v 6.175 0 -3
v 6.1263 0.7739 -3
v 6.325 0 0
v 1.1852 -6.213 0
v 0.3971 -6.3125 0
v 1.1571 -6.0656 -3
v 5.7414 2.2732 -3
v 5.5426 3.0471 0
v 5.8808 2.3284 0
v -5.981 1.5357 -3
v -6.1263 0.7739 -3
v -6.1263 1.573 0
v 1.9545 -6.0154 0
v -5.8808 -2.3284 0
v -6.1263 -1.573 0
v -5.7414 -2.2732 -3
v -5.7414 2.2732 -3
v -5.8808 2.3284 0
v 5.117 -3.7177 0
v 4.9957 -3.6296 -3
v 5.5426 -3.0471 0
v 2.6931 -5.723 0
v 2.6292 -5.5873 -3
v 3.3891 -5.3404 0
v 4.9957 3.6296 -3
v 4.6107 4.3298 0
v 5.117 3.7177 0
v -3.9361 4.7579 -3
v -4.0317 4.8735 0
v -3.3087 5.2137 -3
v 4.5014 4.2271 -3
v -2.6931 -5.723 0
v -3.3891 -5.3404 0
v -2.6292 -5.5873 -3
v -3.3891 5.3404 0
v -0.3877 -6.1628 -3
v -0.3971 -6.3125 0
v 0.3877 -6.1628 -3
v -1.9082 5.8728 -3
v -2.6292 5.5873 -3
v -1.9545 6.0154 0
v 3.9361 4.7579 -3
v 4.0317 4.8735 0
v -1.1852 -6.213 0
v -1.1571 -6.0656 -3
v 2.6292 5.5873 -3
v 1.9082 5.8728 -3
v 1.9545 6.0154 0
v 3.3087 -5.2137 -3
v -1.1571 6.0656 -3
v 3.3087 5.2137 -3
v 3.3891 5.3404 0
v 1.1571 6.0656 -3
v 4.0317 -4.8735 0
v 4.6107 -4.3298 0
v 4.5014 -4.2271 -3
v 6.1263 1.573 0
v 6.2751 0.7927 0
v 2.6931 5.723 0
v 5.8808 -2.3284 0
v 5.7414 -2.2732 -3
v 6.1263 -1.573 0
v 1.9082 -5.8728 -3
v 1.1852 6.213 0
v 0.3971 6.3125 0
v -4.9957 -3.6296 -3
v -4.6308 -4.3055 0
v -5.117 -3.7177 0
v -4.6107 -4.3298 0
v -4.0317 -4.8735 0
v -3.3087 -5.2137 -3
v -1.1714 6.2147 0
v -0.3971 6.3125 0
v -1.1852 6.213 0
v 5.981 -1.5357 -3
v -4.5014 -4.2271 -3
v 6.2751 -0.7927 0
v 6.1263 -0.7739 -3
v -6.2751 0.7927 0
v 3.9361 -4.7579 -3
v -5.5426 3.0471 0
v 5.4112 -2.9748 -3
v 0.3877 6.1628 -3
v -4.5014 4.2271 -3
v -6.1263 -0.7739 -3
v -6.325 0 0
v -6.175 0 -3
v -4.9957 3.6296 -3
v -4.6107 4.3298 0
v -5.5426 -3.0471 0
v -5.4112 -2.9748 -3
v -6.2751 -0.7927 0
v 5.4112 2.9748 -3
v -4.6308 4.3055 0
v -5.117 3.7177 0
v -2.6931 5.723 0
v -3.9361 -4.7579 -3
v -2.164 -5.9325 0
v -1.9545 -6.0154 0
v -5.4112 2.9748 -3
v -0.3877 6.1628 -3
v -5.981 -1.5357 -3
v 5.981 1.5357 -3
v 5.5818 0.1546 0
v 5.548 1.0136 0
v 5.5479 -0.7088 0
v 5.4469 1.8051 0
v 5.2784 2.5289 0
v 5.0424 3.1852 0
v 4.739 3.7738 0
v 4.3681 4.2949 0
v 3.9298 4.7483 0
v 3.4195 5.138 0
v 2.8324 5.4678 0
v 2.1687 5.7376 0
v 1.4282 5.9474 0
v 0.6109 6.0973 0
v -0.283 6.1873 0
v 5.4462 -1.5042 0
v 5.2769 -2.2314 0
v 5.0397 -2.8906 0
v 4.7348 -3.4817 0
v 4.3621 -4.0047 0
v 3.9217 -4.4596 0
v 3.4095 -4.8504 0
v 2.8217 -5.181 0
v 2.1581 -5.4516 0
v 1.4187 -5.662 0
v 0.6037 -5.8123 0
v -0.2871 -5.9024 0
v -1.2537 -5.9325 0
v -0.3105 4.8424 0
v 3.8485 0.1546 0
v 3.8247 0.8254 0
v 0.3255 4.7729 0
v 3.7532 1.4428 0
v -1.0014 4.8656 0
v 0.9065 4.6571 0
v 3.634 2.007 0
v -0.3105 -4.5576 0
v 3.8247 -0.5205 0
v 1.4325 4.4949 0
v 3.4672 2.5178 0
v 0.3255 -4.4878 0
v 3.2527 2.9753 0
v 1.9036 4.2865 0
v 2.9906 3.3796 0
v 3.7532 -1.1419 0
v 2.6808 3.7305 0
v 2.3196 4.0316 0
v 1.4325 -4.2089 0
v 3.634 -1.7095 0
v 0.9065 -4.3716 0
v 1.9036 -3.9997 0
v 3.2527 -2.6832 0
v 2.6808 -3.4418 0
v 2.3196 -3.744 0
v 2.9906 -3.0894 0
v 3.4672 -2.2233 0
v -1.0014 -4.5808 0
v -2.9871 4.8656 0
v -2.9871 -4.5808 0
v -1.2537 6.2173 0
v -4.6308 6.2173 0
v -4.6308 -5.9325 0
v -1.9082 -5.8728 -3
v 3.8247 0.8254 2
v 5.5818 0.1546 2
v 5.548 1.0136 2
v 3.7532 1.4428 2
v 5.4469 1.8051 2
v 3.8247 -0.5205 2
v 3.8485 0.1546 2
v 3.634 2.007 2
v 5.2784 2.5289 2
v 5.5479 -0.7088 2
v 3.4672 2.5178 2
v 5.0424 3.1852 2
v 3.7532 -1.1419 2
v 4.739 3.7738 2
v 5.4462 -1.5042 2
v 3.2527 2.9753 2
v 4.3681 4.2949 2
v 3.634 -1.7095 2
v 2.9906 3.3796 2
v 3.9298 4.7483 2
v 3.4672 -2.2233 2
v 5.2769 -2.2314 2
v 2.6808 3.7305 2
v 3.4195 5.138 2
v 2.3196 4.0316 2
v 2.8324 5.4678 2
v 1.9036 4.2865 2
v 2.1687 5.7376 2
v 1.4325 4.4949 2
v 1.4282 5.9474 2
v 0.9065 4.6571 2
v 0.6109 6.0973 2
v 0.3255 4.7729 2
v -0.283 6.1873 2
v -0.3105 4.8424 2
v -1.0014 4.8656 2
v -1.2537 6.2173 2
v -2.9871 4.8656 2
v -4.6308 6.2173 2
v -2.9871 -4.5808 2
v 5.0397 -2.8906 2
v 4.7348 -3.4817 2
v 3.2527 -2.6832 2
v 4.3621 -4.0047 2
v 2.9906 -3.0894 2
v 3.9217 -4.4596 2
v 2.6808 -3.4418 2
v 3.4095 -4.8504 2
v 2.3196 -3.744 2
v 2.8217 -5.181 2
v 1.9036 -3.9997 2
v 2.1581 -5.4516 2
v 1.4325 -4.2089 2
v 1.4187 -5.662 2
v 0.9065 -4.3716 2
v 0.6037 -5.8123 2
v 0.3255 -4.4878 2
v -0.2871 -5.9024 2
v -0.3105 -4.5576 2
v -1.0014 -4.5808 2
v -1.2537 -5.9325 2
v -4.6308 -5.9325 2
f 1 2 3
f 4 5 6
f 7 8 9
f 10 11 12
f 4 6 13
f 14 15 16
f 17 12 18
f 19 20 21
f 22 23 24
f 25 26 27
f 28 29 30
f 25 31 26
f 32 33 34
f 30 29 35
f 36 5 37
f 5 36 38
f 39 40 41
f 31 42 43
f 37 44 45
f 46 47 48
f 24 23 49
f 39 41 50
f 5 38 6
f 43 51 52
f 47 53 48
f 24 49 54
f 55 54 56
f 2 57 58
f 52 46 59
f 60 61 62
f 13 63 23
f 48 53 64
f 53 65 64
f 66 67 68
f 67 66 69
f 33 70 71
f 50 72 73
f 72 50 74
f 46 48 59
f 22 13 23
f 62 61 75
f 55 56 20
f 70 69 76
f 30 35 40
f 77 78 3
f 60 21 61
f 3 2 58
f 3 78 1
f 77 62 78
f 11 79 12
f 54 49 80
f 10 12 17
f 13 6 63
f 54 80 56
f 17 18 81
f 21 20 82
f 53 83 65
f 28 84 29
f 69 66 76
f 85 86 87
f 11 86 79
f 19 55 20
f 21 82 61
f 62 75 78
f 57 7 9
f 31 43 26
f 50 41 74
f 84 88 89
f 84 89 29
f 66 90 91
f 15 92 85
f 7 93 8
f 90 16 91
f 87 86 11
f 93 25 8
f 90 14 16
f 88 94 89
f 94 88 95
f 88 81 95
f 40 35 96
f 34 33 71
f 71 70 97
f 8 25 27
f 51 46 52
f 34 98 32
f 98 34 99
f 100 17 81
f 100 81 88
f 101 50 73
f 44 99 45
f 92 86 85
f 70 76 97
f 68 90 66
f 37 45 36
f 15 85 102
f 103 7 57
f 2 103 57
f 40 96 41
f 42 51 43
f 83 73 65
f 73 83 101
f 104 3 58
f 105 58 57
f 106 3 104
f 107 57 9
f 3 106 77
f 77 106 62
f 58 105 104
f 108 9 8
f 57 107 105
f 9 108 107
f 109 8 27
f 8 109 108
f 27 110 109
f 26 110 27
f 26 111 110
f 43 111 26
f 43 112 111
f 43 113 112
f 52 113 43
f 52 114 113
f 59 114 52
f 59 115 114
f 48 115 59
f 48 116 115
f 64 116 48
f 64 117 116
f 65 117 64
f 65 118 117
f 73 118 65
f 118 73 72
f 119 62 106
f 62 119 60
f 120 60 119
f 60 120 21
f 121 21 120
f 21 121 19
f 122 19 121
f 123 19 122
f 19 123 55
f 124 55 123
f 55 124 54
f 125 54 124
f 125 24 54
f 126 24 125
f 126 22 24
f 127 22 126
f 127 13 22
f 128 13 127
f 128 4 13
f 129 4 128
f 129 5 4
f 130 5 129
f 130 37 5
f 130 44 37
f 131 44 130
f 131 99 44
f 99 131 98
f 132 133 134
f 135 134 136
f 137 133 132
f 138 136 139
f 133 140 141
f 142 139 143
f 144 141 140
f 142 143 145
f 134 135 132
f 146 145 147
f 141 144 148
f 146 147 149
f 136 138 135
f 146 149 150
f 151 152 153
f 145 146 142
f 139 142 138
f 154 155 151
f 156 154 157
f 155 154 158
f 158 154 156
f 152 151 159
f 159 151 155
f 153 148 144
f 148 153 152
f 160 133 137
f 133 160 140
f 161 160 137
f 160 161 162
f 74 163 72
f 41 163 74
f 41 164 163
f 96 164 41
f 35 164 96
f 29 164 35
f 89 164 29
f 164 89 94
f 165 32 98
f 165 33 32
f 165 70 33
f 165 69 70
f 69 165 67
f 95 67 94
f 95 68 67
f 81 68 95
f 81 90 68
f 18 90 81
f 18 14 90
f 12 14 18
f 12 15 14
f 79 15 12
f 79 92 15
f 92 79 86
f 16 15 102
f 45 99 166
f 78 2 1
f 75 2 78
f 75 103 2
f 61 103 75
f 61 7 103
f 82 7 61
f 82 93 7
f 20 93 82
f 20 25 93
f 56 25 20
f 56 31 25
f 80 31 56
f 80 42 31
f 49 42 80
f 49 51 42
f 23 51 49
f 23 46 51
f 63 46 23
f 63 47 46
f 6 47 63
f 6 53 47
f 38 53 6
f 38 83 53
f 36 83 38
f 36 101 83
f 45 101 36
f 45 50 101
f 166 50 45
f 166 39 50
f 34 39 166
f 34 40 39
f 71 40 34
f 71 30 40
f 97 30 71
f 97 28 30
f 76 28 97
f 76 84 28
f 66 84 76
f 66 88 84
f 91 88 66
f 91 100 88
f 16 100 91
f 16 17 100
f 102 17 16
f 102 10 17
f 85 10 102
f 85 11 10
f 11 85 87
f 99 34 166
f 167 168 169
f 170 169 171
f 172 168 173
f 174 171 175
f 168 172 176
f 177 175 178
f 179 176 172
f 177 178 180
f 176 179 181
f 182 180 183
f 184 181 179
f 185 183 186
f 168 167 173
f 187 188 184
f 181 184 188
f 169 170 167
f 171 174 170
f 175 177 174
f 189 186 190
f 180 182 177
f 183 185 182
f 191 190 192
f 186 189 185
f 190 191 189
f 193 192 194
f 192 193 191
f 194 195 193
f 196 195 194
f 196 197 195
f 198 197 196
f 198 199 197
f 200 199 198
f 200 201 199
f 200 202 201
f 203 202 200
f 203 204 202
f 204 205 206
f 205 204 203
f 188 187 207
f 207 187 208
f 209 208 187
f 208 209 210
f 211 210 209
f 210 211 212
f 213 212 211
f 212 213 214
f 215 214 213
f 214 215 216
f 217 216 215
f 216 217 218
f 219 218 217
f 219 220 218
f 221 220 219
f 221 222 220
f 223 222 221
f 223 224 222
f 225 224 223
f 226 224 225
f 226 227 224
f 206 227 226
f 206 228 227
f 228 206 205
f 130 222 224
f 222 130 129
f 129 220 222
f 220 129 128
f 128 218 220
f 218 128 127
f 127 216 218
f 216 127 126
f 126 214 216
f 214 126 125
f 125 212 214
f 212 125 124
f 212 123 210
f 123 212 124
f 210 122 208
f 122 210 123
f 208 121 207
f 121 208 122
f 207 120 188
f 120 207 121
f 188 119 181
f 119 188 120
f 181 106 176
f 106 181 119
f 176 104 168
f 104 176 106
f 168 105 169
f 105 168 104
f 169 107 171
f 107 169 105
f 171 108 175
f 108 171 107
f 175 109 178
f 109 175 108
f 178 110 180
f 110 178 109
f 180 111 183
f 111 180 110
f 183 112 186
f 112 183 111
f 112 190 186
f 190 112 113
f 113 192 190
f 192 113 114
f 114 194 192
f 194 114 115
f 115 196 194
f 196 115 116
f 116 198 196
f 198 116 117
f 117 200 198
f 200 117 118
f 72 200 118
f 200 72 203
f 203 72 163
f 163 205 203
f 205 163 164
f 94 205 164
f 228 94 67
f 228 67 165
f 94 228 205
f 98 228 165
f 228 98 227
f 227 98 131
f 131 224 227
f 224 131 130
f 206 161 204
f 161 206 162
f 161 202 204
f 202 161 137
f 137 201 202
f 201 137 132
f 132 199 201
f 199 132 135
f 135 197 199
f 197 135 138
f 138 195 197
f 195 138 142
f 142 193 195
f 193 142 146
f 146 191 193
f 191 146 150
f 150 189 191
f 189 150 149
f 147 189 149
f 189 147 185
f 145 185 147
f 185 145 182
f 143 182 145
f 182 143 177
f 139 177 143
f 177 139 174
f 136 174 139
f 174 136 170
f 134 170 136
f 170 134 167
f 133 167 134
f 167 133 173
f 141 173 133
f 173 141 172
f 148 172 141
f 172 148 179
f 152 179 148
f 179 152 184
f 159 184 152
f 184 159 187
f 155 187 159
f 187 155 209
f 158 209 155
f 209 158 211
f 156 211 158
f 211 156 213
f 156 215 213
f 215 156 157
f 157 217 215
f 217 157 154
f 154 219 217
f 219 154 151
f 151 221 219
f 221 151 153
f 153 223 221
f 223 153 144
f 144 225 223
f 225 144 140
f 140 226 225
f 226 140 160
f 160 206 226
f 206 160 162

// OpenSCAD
$fn = 50;

difference() {
	union() {
		translate(v = [0, 0, -3.0]) {
			cylinder(h = 3, r1 = 6.175, r2 = 6.325);
		}
		linear_extrude(height = 2) {
			text(font = "Impact", halign = "center", size = 12, text = "D", valign = "center");
		}
	}
	union();
}
